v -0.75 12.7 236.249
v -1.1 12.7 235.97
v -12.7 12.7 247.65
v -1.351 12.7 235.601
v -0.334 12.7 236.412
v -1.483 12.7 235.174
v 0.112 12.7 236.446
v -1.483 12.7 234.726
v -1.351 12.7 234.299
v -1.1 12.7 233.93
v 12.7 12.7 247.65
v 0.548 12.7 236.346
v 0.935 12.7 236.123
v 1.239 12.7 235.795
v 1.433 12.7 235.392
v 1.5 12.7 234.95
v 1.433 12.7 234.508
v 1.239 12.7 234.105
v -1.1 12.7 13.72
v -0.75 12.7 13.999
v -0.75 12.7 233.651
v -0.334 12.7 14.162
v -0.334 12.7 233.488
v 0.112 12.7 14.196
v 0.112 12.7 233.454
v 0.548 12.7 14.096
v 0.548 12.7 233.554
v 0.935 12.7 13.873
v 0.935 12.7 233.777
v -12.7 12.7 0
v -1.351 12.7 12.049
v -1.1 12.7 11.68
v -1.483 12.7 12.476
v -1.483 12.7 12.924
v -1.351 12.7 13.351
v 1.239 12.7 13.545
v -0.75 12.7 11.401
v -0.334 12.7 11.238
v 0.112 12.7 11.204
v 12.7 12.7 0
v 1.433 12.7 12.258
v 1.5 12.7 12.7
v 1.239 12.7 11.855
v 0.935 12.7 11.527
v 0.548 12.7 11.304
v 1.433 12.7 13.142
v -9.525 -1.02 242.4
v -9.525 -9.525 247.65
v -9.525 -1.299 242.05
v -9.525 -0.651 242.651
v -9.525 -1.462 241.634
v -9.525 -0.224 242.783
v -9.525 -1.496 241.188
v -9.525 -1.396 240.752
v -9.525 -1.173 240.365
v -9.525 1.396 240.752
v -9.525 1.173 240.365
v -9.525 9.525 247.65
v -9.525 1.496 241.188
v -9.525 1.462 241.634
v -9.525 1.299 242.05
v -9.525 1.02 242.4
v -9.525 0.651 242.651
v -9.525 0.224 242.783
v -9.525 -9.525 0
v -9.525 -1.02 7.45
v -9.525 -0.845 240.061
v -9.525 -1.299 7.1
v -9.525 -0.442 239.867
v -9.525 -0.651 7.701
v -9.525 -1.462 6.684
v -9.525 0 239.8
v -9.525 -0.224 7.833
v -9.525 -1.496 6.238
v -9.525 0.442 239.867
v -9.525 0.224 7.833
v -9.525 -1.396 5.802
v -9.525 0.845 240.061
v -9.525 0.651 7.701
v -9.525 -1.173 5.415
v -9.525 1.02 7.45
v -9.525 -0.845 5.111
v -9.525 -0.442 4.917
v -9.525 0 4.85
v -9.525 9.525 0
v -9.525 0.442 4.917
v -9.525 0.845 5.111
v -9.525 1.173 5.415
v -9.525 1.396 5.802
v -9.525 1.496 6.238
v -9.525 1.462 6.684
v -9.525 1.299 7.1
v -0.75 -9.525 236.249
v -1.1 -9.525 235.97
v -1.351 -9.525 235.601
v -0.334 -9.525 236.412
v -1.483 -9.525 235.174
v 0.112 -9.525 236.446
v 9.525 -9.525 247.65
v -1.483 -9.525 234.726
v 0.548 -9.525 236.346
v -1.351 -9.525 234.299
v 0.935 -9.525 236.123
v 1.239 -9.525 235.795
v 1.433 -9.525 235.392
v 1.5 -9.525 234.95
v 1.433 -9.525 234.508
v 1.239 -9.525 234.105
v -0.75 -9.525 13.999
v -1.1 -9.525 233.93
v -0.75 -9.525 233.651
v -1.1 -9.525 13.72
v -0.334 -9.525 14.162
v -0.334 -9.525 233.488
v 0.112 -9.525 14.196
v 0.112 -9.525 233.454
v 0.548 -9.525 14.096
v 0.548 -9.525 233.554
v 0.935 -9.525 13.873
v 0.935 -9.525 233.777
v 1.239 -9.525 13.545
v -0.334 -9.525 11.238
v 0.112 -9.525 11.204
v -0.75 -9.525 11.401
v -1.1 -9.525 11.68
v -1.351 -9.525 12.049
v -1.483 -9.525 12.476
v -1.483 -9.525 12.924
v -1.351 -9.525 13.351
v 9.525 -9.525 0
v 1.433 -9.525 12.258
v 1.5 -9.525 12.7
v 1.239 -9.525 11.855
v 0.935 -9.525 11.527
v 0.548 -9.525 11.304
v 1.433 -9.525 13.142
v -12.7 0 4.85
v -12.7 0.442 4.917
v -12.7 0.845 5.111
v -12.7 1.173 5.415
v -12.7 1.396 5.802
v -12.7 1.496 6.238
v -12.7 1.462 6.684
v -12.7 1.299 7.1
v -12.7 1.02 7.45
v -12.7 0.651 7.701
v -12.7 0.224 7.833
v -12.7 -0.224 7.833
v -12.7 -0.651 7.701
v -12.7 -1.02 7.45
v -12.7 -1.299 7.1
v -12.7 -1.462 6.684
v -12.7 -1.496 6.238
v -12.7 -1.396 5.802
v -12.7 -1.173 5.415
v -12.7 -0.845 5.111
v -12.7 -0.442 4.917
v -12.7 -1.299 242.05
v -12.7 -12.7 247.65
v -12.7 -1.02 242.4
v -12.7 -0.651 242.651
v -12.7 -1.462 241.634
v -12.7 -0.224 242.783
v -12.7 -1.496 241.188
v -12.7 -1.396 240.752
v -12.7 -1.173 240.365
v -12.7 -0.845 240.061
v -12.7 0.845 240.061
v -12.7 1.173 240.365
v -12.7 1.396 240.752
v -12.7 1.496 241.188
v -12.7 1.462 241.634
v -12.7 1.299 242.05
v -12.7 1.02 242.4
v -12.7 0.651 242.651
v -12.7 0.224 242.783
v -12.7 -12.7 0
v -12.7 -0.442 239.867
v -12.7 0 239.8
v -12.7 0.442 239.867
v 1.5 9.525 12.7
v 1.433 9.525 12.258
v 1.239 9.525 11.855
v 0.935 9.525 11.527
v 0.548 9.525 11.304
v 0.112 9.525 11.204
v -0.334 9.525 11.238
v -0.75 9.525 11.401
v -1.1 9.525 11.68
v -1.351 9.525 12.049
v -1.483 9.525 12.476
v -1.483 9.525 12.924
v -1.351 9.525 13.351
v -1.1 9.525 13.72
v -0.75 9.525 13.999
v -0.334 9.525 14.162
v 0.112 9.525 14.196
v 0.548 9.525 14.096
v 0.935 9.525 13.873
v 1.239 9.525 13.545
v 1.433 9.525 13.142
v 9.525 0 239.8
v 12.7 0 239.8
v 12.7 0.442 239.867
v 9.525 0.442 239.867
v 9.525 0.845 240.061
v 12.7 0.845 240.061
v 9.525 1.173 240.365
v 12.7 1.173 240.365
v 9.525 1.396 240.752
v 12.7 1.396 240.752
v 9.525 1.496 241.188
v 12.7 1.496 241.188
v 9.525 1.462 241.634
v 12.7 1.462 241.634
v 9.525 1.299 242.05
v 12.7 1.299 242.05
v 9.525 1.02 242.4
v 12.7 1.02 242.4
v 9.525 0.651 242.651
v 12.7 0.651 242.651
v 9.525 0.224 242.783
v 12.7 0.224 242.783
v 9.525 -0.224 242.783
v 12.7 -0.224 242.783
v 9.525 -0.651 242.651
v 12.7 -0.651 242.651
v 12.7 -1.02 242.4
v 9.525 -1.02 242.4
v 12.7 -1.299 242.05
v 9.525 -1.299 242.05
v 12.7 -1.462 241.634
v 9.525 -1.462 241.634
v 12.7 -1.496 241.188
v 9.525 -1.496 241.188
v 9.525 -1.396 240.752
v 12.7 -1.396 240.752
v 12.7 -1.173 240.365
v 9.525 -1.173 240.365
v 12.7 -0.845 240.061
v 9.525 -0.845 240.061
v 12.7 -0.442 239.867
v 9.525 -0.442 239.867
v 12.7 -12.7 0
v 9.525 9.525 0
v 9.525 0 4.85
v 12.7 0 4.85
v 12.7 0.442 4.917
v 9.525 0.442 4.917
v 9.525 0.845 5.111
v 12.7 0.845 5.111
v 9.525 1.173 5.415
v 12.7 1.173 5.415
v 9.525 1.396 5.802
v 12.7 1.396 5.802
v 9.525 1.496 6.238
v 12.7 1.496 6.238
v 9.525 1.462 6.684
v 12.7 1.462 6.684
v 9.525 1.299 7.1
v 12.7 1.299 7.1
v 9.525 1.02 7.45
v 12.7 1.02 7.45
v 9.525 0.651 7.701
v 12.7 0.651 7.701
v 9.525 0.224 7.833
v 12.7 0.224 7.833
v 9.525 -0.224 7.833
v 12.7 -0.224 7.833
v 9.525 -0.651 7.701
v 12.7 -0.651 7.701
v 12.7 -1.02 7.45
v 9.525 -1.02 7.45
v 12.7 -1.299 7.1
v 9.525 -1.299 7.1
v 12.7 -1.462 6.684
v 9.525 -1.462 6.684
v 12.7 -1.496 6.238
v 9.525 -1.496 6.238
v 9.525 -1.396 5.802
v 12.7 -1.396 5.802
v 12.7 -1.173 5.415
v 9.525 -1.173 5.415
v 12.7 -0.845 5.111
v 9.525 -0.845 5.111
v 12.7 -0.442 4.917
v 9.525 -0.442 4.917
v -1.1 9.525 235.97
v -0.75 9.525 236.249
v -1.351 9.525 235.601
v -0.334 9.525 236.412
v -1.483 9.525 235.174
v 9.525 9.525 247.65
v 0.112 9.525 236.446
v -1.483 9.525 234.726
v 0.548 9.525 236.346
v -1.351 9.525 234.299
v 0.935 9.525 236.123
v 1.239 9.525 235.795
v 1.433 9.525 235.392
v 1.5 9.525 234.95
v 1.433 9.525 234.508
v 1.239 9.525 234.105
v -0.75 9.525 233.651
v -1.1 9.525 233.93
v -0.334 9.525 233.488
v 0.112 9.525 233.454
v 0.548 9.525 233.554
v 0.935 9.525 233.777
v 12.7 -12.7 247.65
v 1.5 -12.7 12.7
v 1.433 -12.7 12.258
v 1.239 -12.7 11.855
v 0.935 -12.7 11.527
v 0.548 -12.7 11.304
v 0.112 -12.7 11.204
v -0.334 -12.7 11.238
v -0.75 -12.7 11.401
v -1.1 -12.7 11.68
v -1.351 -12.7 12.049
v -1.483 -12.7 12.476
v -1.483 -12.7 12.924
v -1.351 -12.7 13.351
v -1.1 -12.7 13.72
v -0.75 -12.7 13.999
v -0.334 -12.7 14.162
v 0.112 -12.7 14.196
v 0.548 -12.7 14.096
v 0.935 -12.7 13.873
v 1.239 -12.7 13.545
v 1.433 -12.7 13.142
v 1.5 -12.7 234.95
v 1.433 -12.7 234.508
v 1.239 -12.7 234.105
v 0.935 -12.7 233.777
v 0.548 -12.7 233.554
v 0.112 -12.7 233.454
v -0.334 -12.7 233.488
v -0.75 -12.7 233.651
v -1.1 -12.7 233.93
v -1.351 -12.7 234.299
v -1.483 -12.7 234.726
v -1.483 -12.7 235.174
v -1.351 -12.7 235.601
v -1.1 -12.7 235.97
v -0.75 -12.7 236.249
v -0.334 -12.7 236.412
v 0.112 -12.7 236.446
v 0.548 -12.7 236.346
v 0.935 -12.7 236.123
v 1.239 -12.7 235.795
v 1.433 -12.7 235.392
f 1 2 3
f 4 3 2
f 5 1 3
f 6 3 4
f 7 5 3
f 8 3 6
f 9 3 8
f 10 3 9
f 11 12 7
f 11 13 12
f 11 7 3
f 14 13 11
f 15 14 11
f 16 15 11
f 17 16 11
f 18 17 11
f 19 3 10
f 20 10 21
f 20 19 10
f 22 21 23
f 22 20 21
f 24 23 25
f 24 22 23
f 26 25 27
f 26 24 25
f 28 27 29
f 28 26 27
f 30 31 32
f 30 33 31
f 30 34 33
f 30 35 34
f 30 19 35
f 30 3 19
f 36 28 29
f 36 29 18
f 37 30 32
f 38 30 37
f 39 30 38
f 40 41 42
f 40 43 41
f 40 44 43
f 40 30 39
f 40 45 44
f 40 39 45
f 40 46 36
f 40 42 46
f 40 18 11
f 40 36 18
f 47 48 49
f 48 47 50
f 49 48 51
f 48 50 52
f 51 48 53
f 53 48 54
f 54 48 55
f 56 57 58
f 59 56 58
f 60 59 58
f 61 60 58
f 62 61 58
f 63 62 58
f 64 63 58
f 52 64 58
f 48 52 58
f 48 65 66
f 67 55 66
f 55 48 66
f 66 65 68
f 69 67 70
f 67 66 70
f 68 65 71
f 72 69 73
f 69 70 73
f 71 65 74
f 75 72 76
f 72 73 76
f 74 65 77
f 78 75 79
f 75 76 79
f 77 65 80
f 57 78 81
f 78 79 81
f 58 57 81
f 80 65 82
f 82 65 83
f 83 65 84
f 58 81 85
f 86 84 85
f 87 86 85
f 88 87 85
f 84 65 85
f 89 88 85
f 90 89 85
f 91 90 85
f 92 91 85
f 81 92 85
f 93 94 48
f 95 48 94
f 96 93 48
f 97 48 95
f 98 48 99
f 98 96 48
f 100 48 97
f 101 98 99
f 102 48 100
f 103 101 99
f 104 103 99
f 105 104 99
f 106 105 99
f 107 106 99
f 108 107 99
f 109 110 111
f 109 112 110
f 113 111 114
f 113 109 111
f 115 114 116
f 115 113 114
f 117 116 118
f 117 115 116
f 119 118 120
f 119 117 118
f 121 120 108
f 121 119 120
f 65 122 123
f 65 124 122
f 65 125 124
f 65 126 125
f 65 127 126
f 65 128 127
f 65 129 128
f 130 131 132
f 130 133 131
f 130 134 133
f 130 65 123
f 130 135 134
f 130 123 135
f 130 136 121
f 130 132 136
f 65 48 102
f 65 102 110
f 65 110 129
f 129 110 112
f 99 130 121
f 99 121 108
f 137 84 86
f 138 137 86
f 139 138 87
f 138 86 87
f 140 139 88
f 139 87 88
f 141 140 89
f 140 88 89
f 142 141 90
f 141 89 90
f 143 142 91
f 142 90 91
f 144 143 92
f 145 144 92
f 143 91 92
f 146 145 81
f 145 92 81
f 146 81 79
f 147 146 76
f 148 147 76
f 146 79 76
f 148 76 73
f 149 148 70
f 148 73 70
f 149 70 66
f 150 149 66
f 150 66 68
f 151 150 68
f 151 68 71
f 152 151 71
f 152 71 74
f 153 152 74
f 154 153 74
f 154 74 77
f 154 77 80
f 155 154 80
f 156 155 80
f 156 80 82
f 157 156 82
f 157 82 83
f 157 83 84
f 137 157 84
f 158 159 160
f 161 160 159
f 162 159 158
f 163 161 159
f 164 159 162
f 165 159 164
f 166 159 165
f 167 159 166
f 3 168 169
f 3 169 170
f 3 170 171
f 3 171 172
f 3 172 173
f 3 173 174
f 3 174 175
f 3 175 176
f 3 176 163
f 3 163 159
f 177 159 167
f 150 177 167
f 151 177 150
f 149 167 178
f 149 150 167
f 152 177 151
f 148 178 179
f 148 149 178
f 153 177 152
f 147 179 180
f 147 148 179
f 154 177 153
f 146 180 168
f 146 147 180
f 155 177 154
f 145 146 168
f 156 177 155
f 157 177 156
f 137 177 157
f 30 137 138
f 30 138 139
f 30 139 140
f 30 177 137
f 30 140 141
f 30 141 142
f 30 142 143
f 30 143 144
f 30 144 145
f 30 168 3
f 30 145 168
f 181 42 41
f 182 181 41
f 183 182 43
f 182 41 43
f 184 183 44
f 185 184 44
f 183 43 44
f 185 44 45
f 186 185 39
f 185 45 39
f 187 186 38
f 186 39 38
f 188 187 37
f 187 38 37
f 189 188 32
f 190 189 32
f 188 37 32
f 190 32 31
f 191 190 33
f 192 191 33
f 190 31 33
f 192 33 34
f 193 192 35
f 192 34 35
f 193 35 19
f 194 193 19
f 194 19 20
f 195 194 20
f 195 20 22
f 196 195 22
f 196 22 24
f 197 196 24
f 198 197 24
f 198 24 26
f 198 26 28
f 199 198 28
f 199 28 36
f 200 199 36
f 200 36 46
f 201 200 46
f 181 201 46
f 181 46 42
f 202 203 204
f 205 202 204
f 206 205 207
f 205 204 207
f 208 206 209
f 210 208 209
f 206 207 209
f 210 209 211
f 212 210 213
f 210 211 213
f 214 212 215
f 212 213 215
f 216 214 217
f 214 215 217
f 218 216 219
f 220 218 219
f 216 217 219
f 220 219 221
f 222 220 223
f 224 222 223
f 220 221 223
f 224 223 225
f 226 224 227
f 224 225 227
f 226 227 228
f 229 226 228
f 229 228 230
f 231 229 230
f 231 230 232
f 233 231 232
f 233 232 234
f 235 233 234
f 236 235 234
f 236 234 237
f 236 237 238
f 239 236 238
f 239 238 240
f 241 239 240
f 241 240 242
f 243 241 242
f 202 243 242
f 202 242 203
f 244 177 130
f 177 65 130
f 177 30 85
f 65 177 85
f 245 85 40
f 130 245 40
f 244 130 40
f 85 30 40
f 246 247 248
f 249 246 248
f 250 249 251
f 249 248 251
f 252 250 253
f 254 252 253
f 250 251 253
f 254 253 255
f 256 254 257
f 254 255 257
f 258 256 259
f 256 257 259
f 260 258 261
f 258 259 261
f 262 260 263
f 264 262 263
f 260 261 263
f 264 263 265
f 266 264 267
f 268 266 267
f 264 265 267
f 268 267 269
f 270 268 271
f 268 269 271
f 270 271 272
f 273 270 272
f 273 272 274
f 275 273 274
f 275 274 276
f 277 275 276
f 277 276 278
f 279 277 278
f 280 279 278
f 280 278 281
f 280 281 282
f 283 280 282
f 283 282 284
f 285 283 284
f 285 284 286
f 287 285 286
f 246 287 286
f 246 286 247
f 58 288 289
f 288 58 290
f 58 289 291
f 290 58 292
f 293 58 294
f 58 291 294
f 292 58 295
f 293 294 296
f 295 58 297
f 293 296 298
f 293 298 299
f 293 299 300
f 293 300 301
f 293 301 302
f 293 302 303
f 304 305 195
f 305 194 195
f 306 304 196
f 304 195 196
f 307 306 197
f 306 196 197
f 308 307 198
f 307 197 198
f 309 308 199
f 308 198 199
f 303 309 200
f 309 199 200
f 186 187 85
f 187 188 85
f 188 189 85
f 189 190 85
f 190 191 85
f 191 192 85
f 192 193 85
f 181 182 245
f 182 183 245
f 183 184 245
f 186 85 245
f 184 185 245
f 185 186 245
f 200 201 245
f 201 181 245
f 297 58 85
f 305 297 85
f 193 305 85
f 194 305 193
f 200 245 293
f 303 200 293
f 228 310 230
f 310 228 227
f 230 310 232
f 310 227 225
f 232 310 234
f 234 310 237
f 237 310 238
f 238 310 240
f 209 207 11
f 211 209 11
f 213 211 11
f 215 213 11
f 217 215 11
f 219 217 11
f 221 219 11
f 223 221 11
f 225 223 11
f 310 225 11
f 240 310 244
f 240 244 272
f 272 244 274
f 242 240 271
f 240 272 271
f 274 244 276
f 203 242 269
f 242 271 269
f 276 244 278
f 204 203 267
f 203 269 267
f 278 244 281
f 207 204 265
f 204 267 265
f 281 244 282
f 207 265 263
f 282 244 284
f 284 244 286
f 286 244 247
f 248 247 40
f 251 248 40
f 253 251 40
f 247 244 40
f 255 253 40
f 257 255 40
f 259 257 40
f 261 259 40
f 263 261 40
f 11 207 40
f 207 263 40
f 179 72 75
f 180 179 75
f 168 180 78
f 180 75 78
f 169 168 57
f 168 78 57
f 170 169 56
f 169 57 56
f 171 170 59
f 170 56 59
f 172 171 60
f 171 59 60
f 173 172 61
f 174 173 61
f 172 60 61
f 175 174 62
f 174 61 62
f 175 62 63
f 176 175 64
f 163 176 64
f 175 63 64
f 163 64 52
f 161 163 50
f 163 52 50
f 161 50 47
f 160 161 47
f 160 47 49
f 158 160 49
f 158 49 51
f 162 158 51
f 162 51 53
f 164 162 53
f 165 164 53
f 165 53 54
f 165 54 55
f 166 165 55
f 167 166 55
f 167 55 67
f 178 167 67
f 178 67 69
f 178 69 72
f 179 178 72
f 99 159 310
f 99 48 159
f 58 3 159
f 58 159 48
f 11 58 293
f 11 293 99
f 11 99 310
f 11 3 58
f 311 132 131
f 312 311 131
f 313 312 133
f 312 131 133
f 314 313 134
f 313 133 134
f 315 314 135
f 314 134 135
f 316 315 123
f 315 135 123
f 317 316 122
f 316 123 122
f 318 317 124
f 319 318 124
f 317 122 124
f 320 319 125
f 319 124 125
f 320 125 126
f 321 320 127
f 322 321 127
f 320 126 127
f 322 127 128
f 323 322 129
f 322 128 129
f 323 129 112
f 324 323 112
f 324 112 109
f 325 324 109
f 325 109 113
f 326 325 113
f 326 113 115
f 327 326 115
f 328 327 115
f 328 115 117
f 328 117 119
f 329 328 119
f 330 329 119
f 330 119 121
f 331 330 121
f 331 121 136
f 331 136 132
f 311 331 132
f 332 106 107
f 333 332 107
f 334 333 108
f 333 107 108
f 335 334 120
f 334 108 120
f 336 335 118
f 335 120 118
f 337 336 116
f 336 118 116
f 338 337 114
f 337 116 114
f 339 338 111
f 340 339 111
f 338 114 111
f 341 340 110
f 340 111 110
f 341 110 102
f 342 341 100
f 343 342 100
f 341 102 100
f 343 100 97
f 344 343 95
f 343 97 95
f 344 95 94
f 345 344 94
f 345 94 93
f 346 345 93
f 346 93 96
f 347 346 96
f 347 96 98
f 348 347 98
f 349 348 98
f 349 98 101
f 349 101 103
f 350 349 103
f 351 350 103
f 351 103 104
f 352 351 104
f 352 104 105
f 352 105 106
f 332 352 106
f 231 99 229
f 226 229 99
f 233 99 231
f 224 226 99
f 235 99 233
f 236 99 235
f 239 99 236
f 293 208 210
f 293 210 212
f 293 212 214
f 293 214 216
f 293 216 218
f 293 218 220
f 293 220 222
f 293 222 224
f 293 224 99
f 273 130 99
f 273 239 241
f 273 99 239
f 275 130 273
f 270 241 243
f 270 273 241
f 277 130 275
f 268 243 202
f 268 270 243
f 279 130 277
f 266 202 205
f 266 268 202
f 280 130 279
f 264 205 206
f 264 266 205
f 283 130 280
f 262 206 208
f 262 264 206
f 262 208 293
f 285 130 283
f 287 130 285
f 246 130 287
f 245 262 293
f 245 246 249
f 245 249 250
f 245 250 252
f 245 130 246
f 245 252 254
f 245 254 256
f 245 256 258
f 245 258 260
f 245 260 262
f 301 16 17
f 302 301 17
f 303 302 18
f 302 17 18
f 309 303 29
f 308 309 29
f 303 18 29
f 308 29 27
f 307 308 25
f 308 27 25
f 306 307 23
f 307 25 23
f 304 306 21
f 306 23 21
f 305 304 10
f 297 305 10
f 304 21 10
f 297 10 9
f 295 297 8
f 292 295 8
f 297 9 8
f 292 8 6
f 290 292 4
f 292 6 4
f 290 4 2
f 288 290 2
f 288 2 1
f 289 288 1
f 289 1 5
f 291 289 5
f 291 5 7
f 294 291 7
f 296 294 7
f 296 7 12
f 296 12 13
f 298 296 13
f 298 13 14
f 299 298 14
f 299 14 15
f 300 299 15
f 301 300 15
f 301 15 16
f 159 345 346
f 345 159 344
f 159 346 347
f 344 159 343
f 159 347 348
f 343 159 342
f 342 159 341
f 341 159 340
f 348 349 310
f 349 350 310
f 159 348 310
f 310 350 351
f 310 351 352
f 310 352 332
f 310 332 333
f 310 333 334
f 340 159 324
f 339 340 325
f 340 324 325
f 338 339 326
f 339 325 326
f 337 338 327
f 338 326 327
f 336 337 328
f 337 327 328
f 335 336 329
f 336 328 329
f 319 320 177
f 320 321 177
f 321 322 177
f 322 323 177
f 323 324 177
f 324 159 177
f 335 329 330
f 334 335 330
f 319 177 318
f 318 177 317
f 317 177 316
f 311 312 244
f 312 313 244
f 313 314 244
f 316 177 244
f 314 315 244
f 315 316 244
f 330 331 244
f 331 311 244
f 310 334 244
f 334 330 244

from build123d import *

# Parameters (mm, degrees)
SKETCH1_W           = 25.4
SKETCH1_H           = 25.4
SKETCH1_W_2         = 19.05
SKETCH1_H_2         = 19.05
BOSS_EXTRUDE1_DEPTH = 247.65
SKETCH2_R           = 1.5
CUT_EXTRUDE1_DEPTH  = 254
SKETCH3_R           = 1.5
CUT_EXTRUDE2_DEPTH  = 254


with BuildPart() as part:
    # Sketch1 → Boss-Extrude1 (new body)
    with BuildSketch(Plane.XY):
        Rectangle(SKETCH1_W, SKETCH1_H)
        Rectangle(SKETCH1_W_2, SKETCH1_H_2, mode=Mode.SUBTRACT)
    extrude(amount=BOSS_EXTRUDE1_DEPTH)

    # Sketch2 → Cut-Extrude1 (cut)
    with BuildSketch(Plane(origin=(12.7, 0, 0), x_dir=(0, 0, -1), z_dir=(1, 0, 0))):
        with Locations((-241.3, 0)):
            Circle(SKETCH2_R)
        with Locations((-6.35, 0)):
            Circle(SKETCH2_R)
    extrude(amount=-CUT_EXTRUDE1_DEPTH, mode=Mode.SUBTRACT)

    # Sketch3 → Cut-Extrude2 (cut)
    with BuildSketch(Plane(origin=(0, 12.7, 0), x_dir=(1, 0, 0), z_dir=(0, 1, 0))):
        with Locations((0, -12.7)):
            Circle(SKETCH3_R)
        with Locations((0, -234.95)):
            Circle(SKETCH3_R)
    extrude(amount=-CUT_EXTRUDE2_DEPTH, mode=Mode.SUBTRACT)


solid = part.part
